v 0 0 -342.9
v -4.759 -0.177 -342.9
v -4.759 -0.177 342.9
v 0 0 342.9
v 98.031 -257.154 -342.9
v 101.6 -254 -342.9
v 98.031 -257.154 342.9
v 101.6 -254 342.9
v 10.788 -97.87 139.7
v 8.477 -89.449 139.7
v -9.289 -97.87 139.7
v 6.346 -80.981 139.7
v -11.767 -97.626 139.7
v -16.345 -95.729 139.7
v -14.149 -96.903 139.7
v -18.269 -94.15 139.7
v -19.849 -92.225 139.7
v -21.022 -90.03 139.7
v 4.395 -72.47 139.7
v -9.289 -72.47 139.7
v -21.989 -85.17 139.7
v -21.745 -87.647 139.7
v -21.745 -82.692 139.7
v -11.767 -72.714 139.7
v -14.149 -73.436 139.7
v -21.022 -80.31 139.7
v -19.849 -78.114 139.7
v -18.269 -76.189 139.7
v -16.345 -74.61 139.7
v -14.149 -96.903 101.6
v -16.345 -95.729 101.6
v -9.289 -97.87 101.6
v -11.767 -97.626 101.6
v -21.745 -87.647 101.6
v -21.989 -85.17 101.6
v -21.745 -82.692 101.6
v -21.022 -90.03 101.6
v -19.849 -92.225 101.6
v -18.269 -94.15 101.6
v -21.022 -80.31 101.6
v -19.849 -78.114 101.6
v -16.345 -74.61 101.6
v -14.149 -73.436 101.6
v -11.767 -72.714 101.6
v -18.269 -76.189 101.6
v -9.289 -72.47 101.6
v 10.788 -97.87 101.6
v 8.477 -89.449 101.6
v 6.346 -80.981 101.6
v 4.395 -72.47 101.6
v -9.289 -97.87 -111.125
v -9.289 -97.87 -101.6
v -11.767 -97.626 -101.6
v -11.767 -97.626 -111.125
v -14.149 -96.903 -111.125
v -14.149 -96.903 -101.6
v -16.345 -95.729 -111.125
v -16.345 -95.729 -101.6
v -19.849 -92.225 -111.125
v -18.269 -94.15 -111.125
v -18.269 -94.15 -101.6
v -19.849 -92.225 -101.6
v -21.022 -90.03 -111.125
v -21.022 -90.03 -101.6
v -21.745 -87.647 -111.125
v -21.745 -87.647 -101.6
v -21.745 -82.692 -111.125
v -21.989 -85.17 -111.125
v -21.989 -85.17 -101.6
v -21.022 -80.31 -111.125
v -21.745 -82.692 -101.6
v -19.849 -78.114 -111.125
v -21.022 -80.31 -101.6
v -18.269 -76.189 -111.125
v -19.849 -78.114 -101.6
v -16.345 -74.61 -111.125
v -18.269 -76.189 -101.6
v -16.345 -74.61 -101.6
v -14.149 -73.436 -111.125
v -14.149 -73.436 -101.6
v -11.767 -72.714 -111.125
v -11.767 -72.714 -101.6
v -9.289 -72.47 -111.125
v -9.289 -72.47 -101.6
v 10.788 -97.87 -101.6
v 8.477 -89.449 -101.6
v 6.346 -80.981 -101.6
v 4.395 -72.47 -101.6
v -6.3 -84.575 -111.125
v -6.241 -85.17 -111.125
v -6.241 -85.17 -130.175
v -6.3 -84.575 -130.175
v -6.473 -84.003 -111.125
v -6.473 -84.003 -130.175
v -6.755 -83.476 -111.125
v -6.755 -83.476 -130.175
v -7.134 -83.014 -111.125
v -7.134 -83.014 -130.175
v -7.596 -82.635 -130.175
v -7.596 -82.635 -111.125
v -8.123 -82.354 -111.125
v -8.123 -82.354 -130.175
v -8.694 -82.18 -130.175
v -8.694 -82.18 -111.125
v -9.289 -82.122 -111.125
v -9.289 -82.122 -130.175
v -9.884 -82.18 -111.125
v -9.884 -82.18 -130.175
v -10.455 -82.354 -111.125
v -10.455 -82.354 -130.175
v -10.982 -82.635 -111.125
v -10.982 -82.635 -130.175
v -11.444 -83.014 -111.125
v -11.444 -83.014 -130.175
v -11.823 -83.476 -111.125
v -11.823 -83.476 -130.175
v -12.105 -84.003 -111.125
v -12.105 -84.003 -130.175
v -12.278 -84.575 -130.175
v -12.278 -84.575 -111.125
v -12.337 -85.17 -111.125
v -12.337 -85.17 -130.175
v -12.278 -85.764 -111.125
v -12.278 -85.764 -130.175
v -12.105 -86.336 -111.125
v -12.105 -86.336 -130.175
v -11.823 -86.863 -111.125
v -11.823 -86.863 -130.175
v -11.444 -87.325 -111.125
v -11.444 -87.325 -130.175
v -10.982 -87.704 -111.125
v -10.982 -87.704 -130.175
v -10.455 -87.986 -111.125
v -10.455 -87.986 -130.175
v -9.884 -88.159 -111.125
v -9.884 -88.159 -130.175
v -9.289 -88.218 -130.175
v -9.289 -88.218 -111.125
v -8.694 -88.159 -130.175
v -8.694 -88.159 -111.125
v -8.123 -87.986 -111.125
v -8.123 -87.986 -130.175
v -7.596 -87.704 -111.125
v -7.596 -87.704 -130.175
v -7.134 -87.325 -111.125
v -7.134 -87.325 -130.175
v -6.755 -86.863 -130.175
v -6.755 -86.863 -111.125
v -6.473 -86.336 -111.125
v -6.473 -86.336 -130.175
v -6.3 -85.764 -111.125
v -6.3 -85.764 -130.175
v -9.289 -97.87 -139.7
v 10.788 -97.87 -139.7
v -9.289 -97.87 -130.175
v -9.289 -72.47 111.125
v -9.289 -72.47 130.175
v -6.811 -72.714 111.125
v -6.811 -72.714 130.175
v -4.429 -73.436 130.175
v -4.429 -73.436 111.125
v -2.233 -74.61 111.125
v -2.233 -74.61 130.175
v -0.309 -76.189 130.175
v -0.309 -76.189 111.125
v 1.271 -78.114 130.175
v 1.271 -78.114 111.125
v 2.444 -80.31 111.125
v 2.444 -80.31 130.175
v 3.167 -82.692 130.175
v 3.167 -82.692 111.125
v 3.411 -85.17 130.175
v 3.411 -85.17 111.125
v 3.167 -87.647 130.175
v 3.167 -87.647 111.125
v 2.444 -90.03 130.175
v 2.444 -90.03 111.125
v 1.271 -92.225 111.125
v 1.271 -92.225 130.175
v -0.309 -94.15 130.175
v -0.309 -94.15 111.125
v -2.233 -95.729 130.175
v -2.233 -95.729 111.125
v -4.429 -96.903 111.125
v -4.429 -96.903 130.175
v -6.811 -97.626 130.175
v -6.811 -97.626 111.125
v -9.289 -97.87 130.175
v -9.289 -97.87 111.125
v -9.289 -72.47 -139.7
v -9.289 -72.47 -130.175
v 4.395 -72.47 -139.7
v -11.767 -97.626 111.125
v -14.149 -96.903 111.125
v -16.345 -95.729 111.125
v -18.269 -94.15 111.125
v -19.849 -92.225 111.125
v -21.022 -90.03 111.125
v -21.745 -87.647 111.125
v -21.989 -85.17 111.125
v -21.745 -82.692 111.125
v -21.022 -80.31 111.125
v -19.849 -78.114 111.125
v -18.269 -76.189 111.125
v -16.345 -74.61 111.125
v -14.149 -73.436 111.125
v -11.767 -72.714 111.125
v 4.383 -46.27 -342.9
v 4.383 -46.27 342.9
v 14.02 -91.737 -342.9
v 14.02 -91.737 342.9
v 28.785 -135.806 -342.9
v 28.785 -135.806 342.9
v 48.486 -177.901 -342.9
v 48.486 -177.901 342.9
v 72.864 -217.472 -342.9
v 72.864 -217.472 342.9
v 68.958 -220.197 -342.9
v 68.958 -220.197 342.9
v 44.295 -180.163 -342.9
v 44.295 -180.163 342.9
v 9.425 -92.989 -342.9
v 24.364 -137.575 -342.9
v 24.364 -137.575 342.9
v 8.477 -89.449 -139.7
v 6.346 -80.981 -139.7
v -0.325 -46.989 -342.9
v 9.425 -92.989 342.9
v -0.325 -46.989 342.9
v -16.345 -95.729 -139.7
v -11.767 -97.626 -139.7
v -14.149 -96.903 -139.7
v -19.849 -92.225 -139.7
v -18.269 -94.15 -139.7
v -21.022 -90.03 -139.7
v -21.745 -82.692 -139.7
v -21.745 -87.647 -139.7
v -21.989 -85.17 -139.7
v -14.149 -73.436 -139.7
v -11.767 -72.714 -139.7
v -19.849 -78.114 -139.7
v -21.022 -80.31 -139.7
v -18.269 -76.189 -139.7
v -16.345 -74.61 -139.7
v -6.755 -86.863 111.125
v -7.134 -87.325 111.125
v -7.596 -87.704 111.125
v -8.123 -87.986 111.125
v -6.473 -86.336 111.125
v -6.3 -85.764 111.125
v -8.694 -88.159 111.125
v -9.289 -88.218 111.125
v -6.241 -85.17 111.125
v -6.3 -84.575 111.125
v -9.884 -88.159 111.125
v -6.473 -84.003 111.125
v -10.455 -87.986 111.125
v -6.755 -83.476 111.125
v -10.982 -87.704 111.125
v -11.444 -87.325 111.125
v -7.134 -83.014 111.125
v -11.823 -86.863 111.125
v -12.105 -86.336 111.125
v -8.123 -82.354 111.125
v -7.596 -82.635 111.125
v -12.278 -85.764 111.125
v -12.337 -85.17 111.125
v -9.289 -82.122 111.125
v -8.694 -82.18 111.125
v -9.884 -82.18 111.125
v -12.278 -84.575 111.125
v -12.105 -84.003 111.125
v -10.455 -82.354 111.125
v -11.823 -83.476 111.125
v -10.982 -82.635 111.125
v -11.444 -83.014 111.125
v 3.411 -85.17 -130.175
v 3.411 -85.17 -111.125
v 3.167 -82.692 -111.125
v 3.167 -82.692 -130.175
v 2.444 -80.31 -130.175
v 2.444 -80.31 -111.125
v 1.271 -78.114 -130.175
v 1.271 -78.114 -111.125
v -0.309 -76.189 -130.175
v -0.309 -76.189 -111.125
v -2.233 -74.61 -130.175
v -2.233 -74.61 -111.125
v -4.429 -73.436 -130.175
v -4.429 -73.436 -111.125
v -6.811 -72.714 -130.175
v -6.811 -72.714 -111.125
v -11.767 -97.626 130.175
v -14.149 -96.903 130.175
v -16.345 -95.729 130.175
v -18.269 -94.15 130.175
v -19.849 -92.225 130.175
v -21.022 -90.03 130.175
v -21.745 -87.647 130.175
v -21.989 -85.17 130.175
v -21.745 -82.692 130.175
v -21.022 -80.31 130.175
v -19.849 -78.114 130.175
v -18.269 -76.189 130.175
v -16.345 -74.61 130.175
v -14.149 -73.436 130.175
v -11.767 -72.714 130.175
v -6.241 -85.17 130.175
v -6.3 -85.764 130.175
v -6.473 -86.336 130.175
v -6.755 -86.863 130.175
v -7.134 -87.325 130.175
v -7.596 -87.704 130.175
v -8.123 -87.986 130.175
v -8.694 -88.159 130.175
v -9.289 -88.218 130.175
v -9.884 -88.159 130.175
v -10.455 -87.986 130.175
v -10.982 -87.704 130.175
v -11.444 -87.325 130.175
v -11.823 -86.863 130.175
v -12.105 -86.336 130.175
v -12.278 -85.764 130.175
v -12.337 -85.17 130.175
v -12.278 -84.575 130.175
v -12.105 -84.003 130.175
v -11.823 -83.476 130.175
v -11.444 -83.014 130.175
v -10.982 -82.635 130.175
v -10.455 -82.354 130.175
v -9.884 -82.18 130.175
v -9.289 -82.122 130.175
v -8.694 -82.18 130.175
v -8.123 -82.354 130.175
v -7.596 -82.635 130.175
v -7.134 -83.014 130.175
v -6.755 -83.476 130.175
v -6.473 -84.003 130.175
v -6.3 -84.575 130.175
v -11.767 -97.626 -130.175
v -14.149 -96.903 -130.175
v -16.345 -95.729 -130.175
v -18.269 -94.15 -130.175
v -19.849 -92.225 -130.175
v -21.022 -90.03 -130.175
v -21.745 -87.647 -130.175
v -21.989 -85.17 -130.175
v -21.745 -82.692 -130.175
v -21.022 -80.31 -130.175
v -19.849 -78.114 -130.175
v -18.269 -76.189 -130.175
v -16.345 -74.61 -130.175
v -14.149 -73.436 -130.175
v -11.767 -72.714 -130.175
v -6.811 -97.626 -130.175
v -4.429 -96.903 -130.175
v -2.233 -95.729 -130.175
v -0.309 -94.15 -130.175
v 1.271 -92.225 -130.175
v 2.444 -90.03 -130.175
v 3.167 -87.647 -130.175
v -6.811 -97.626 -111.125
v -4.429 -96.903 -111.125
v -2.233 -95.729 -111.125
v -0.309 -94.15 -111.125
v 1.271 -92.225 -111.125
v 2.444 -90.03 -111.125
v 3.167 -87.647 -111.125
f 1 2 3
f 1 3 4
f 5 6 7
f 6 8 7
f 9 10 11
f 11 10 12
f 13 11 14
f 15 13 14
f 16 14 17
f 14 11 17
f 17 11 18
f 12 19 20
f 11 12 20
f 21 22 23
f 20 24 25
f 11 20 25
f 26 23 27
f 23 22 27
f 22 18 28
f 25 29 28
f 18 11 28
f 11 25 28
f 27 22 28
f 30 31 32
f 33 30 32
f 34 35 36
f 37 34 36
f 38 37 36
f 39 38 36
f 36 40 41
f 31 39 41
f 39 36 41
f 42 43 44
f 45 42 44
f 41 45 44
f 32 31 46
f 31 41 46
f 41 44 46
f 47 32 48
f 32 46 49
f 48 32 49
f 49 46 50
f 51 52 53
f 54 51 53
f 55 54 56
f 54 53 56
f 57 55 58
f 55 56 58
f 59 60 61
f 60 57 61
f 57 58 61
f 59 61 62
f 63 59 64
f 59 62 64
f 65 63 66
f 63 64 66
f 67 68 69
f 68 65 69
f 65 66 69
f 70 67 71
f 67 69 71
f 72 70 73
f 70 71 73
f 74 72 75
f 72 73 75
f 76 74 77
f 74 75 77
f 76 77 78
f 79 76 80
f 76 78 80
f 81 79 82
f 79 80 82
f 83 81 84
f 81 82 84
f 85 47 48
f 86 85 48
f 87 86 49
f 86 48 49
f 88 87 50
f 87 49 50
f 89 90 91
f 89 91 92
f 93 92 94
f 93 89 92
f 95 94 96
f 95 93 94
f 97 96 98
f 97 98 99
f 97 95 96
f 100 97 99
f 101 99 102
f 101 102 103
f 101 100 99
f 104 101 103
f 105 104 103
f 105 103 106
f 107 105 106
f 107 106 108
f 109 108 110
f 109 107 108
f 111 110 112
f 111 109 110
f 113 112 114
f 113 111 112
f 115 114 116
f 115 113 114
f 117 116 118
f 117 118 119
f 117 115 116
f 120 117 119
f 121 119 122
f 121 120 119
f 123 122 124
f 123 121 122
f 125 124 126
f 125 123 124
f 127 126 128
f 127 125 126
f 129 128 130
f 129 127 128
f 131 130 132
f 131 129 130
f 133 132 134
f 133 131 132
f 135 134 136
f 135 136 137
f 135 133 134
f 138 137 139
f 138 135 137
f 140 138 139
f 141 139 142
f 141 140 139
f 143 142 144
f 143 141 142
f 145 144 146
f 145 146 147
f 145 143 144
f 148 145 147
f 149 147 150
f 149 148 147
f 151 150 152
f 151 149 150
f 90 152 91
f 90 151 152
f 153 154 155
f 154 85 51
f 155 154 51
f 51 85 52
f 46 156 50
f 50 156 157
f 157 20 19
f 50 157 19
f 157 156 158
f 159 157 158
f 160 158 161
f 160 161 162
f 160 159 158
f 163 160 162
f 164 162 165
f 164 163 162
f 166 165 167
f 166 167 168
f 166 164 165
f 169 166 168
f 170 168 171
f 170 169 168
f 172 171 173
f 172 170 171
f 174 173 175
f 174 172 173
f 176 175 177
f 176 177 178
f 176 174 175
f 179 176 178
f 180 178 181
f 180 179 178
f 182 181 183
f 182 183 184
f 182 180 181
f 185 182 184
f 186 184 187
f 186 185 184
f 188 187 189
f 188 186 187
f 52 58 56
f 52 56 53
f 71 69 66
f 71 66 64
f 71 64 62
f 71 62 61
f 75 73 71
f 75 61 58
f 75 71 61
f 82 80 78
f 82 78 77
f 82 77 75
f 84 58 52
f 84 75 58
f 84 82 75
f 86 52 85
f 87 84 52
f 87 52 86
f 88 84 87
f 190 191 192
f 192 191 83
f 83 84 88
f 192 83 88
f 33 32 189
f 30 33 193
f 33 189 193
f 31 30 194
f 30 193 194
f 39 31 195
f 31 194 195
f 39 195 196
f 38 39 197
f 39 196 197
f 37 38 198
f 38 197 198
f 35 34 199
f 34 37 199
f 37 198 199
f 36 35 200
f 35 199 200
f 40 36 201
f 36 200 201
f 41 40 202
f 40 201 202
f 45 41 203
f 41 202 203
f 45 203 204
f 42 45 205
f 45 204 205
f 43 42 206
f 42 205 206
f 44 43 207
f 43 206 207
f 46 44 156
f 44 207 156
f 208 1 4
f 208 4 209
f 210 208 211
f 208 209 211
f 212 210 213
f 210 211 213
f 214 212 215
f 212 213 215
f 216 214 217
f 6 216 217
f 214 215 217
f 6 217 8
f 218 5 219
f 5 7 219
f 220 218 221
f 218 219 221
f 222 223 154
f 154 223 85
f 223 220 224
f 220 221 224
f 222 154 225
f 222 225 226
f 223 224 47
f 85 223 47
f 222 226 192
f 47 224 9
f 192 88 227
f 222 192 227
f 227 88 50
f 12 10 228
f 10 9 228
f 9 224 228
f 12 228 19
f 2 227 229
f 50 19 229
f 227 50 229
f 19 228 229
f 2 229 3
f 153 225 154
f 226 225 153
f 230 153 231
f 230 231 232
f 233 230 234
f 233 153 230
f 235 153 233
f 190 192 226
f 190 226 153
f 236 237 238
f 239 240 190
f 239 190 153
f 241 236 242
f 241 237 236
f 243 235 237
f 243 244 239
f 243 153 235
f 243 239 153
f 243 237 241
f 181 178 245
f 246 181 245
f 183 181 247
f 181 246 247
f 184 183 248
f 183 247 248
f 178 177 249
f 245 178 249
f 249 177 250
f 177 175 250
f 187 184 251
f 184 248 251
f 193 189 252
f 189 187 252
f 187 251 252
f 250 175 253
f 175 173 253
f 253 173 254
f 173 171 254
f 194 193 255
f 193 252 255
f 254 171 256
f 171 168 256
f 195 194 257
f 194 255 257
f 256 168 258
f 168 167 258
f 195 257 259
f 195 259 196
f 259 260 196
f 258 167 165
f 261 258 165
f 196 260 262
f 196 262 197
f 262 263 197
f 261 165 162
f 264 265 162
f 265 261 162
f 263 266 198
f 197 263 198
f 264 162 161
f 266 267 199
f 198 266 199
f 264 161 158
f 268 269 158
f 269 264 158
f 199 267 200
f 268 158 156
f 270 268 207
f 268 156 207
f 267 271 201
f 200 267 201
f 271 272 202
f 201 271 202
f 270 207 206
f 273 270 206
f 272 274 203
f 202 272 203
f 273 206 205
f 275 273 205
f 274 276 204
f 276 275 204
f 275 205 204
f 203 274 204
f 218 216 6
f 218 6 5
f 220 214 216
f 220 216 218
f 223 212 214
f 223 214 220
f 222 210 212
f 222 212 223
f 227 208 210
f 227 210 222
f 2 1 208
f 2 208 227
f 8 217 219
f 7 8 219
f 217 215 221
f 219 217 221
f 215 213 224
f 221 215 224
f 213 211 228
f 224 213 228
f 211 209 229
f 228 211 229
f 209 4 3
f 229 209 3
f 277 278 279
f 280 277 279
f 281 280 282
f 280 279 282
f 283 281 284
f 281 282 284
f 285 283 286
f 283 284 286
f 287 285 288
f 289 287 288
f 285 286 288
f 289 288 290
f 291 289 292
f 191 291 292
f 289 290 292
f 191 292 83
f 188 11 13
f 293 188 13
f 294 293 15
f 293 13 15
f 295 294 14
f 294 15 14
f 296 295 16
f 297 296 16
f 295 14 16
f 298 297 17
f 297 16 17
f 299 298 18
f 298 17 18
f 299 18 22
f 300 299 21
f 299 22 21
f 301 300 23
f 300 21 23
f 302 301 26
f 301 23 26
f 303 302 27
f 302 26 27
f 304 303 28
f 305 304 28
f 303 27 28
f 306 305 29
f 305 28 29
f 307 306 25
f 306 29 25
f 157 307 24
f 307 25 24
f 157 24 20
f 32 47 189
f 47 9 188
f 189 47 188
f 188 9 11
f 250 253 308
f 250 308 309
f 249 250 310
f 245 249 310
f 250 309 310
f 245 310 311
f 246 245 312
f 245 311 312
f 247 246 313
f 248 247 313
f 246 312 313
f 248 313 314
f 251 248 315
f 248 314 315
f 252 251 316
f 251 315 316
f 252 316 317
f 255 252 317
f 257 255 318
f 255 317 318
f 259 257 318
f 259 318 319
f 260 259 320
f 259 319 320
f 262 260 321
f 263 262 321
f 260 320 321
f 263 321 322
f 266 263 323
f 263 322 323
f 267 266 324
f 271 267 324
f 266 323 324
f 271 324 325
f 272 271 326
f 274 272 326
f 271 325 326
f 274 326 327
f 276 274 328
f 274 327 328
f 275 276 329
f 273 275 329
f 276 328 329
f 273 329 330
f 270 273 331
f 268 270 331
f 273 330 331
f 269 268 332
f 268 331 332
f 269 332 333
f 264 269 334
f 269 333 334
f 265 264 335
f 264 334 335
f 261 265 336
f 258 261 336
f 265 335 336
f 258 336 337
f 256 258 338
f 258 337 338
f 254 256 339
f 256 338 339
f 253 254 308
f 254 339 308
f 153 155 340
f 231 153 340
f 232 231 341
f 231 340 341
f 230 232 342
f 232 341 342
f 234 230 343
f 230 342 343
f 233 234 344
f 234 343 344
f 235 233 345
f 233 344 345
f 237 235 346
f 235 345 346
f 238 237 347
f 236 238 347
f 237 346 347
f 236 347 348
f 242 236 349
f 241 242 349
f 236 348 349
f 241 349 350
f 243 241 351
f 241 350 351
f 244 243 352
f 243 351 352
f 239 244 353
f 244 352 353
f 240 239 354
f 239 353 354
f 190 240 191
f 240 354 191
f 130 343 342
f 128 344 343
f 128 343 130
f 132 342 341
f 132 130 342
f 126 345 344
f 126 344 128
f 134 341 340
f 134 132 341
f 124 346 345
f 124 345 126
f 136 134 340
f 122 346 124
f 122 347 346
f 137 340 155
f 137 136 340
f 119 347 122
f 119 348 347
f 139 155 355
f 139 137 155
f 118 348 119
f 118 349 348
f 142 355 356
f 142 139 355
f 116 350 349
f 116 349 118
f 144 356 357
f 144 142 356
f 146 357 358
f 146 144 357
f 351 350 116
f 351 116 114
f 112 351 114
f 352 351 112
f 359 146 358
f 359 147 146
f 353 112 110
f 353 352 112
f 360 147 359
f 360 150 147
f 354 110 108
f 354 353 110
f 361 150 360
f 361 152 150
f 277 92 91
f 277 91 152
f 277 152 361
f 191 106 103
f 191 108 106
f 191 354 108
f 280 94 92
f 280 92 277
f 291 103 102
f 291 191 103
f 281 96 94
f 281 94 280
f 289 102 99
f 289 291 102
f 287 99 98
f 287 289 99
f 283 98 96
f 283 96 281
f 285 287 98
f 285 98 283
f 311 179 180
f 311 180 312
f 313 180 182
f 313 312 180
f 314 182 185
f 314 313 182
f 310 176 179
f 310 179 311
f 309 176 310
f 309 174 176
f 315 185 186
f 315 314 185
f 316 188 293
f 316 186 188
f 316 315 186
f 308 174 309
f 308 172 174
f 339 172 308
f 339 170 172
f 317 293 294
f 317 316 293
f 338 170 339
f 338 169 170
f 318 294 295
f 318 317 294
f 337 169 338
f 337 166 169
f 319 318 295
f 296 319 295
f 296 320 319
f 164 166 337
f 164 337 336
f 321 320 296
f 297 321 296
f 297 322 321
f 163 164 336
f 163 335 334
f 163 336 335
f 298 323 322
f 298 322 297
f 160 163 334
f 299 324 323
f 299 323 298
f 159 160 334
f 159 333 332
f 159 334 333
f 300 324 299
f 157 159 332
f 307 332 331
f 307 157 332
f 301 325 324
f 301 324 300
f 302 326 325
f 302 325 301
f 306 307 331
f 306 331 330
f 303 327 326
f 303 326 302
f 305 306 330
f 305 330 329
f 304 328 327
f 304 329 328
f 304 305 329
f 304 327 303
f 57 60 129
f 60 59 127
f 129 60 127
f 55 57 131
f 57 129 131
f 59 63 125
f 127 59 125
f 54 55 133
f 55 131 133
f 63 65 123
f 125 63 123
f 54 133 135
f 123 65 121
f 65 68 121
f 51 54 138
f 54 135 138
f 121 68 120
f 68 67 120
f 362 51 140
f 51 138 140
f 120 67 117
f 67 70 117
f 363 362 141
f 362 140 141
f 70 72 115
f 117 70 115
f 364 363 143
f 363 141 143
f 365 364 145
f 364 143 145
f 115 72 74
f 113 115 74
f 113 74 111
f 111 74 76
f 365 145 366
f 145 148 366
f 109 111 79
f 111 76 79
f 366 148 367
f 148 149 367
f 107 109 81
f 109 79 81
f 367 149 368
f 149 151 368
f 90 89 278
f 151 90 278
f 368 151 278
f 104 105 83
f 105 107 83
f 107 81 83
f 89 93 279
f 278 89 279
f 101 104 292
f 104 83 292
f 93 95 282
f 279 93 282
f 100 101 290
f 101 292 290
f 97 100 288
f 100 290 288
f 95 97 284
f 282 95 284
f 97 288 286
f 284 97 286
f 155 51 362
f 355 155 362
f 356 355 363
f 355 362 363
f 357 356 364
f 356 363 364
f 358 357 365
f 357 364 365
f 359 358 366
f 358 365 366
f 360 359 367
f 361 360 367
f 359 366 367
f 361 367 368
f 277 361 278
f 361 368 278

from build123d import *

# Parameters (mm, degrees)
EXTRUDE_THIN1_DEPTH = 342.9
BOSS_EXTRUDE1_START = -203.2
BOSS_EXTRUDE1_DEPTH = 279.4
CUT_EXTRUDE1_START  = -38.1
CUT_EXTRUDE1_DEPTH  = 203.2
CUT_EXTRUDE2_START  = -9.525
SKETCH4_R           = 3.048
CUT_EXTRUDE2_DEPTH  = 19.05
CUT_EXTRUDE3_START  = -28.575
SKETCH5_R           = 3.048
CUT_EXTRUDE3_DEPTH  = 19.05


with BuildPart() as part:
    # Sketch1 → Extrude-Thin1 (new, symmetric)
    with BuildSketch(Plane.XY):
        with BuildLine():
            ThreePointArc((0, 0), (28.7854342, -135.80582632), (101.6, -254))
            Line((101.6, -254), (98.031425453, -257.153836069))
            ThreePointArc((98.031425453, -257.153836069), (24.36356396, -137.574574416), (-4.759199547, -0.177273569))
            Line((-4.759199547, -0.177273569), (0, 0))
        make_face()
    extrude(amount=EXTRUDE_THIN1_DEPTH, both=True)

    # Sketch2 → Boss-Extrude1 (add)
    with BuildSketch(Plane.XY.offset(342.9).offset(BOSS_EXTRUDE1_START)):
        with BuildLine():
            Line((-9.288950239, -72.469656114), (4.395363676, -72.469656114))
            ThreePointArc((4.395363676, -72.469656114), (7.38925865, -85.220570454), (10.787766498, -97.869656114))
            Line((10.787766498, -97.869656114), (-9.288950239, -97.869656114))
            ThreePointArc((-9.288950239, -97.869656114), (-21.988950239, -85.169656114), (-9.288950239, -72.469656114))
        make_face()
    extrude(amount=-BOSS_EXTRUDE1_DEPTH)

    # Sketch3 → Cut-Extrude1 (cut)
    with BuildSketch(Plane.XY.offset(139.7).offset(CUT_EXTRUDE1_START)):
        with BuildLine():
            Line((-9.288950239, -97.869656114), (10.787766498, -97.869656114))
            ThreePointArc((10.787766498, -97.869656114), (7.38925865, -85.220570454), (4.395363676, -72.469656114))
            Line((4.395363676, -72.469656114), (-9.288950239, -72.469656114))
            ThreePointArc((-9.288950239, -72.469656114), (-21.988950239, -85.169656114), (-9.288950239, -97.869656114))
        make_face()
    extrude(amount=-CUT_EXTRUDE1_DEPTH, mode=Mode.SUBTRACT)

    # Sketch4 → Cut-Extrude2 (cut)
    with BuildSketch(Plane.XY.offset(-101.6).offset(CUT_EXTRUDE2_START)):
        with BuildLine():
            ThreePointArc((-9.288950239, -97.869656114), (-0.308694117, -94.149912235), (3.411049761, -85.169656114))
            ThreePointArc((3.411049761, -85.169656114), (-0.308694117, -76.189399993), (-9.288950239, -72.469656114))
            ThreePointArc((-9.288950239, -72.469656114), (-21.988950239, -85.169656114), (-9.288950239, -97.869656114))
        make_face()
        with Locations((-9.288950239, -85.169656114)):
            Circle(SKETCH4_R, mode=Mode.SUBTRACT)
    extrude(amount=-CUT_EXTRUDE2_DEPTH, mode=Mode.SUBTRACT)

    # Sketch5 → Cut-Extrude3 (cut)
    with BuildSketch(Plane(origin=(0, 0, 101.6), x_dir=(-1, 0, 0), z_dir=(0, 0, -1)).offset(CUT_EXTRUDE3_START)):
        with BuildLine():
            ThreePointArc((9.288950239, -97.869656114), (18.26920636, -94.149912235), (21.988950239, -85.169656114))
            ThreePointArc((21.988950239, -85.169656114), (18.26920636, -76.189399993), (9.288950239, -72.469656114))
            ThreePointArc((9.288950239, -72.469656114), (-3.411049761, -85.169656114), (9.288950239, -97.869656114))
        make_face()
        with Locations(Location((9.288950239, -85.169656114, 0), (0, 0, 180))):
            Circle(SKETCH5_R, mode=Mode.SUBTRACT)
    extrude(amount=CUT_EXTRUDE3_DEPTH, mode=Mode.SUBTRACT)


solid = part.part
